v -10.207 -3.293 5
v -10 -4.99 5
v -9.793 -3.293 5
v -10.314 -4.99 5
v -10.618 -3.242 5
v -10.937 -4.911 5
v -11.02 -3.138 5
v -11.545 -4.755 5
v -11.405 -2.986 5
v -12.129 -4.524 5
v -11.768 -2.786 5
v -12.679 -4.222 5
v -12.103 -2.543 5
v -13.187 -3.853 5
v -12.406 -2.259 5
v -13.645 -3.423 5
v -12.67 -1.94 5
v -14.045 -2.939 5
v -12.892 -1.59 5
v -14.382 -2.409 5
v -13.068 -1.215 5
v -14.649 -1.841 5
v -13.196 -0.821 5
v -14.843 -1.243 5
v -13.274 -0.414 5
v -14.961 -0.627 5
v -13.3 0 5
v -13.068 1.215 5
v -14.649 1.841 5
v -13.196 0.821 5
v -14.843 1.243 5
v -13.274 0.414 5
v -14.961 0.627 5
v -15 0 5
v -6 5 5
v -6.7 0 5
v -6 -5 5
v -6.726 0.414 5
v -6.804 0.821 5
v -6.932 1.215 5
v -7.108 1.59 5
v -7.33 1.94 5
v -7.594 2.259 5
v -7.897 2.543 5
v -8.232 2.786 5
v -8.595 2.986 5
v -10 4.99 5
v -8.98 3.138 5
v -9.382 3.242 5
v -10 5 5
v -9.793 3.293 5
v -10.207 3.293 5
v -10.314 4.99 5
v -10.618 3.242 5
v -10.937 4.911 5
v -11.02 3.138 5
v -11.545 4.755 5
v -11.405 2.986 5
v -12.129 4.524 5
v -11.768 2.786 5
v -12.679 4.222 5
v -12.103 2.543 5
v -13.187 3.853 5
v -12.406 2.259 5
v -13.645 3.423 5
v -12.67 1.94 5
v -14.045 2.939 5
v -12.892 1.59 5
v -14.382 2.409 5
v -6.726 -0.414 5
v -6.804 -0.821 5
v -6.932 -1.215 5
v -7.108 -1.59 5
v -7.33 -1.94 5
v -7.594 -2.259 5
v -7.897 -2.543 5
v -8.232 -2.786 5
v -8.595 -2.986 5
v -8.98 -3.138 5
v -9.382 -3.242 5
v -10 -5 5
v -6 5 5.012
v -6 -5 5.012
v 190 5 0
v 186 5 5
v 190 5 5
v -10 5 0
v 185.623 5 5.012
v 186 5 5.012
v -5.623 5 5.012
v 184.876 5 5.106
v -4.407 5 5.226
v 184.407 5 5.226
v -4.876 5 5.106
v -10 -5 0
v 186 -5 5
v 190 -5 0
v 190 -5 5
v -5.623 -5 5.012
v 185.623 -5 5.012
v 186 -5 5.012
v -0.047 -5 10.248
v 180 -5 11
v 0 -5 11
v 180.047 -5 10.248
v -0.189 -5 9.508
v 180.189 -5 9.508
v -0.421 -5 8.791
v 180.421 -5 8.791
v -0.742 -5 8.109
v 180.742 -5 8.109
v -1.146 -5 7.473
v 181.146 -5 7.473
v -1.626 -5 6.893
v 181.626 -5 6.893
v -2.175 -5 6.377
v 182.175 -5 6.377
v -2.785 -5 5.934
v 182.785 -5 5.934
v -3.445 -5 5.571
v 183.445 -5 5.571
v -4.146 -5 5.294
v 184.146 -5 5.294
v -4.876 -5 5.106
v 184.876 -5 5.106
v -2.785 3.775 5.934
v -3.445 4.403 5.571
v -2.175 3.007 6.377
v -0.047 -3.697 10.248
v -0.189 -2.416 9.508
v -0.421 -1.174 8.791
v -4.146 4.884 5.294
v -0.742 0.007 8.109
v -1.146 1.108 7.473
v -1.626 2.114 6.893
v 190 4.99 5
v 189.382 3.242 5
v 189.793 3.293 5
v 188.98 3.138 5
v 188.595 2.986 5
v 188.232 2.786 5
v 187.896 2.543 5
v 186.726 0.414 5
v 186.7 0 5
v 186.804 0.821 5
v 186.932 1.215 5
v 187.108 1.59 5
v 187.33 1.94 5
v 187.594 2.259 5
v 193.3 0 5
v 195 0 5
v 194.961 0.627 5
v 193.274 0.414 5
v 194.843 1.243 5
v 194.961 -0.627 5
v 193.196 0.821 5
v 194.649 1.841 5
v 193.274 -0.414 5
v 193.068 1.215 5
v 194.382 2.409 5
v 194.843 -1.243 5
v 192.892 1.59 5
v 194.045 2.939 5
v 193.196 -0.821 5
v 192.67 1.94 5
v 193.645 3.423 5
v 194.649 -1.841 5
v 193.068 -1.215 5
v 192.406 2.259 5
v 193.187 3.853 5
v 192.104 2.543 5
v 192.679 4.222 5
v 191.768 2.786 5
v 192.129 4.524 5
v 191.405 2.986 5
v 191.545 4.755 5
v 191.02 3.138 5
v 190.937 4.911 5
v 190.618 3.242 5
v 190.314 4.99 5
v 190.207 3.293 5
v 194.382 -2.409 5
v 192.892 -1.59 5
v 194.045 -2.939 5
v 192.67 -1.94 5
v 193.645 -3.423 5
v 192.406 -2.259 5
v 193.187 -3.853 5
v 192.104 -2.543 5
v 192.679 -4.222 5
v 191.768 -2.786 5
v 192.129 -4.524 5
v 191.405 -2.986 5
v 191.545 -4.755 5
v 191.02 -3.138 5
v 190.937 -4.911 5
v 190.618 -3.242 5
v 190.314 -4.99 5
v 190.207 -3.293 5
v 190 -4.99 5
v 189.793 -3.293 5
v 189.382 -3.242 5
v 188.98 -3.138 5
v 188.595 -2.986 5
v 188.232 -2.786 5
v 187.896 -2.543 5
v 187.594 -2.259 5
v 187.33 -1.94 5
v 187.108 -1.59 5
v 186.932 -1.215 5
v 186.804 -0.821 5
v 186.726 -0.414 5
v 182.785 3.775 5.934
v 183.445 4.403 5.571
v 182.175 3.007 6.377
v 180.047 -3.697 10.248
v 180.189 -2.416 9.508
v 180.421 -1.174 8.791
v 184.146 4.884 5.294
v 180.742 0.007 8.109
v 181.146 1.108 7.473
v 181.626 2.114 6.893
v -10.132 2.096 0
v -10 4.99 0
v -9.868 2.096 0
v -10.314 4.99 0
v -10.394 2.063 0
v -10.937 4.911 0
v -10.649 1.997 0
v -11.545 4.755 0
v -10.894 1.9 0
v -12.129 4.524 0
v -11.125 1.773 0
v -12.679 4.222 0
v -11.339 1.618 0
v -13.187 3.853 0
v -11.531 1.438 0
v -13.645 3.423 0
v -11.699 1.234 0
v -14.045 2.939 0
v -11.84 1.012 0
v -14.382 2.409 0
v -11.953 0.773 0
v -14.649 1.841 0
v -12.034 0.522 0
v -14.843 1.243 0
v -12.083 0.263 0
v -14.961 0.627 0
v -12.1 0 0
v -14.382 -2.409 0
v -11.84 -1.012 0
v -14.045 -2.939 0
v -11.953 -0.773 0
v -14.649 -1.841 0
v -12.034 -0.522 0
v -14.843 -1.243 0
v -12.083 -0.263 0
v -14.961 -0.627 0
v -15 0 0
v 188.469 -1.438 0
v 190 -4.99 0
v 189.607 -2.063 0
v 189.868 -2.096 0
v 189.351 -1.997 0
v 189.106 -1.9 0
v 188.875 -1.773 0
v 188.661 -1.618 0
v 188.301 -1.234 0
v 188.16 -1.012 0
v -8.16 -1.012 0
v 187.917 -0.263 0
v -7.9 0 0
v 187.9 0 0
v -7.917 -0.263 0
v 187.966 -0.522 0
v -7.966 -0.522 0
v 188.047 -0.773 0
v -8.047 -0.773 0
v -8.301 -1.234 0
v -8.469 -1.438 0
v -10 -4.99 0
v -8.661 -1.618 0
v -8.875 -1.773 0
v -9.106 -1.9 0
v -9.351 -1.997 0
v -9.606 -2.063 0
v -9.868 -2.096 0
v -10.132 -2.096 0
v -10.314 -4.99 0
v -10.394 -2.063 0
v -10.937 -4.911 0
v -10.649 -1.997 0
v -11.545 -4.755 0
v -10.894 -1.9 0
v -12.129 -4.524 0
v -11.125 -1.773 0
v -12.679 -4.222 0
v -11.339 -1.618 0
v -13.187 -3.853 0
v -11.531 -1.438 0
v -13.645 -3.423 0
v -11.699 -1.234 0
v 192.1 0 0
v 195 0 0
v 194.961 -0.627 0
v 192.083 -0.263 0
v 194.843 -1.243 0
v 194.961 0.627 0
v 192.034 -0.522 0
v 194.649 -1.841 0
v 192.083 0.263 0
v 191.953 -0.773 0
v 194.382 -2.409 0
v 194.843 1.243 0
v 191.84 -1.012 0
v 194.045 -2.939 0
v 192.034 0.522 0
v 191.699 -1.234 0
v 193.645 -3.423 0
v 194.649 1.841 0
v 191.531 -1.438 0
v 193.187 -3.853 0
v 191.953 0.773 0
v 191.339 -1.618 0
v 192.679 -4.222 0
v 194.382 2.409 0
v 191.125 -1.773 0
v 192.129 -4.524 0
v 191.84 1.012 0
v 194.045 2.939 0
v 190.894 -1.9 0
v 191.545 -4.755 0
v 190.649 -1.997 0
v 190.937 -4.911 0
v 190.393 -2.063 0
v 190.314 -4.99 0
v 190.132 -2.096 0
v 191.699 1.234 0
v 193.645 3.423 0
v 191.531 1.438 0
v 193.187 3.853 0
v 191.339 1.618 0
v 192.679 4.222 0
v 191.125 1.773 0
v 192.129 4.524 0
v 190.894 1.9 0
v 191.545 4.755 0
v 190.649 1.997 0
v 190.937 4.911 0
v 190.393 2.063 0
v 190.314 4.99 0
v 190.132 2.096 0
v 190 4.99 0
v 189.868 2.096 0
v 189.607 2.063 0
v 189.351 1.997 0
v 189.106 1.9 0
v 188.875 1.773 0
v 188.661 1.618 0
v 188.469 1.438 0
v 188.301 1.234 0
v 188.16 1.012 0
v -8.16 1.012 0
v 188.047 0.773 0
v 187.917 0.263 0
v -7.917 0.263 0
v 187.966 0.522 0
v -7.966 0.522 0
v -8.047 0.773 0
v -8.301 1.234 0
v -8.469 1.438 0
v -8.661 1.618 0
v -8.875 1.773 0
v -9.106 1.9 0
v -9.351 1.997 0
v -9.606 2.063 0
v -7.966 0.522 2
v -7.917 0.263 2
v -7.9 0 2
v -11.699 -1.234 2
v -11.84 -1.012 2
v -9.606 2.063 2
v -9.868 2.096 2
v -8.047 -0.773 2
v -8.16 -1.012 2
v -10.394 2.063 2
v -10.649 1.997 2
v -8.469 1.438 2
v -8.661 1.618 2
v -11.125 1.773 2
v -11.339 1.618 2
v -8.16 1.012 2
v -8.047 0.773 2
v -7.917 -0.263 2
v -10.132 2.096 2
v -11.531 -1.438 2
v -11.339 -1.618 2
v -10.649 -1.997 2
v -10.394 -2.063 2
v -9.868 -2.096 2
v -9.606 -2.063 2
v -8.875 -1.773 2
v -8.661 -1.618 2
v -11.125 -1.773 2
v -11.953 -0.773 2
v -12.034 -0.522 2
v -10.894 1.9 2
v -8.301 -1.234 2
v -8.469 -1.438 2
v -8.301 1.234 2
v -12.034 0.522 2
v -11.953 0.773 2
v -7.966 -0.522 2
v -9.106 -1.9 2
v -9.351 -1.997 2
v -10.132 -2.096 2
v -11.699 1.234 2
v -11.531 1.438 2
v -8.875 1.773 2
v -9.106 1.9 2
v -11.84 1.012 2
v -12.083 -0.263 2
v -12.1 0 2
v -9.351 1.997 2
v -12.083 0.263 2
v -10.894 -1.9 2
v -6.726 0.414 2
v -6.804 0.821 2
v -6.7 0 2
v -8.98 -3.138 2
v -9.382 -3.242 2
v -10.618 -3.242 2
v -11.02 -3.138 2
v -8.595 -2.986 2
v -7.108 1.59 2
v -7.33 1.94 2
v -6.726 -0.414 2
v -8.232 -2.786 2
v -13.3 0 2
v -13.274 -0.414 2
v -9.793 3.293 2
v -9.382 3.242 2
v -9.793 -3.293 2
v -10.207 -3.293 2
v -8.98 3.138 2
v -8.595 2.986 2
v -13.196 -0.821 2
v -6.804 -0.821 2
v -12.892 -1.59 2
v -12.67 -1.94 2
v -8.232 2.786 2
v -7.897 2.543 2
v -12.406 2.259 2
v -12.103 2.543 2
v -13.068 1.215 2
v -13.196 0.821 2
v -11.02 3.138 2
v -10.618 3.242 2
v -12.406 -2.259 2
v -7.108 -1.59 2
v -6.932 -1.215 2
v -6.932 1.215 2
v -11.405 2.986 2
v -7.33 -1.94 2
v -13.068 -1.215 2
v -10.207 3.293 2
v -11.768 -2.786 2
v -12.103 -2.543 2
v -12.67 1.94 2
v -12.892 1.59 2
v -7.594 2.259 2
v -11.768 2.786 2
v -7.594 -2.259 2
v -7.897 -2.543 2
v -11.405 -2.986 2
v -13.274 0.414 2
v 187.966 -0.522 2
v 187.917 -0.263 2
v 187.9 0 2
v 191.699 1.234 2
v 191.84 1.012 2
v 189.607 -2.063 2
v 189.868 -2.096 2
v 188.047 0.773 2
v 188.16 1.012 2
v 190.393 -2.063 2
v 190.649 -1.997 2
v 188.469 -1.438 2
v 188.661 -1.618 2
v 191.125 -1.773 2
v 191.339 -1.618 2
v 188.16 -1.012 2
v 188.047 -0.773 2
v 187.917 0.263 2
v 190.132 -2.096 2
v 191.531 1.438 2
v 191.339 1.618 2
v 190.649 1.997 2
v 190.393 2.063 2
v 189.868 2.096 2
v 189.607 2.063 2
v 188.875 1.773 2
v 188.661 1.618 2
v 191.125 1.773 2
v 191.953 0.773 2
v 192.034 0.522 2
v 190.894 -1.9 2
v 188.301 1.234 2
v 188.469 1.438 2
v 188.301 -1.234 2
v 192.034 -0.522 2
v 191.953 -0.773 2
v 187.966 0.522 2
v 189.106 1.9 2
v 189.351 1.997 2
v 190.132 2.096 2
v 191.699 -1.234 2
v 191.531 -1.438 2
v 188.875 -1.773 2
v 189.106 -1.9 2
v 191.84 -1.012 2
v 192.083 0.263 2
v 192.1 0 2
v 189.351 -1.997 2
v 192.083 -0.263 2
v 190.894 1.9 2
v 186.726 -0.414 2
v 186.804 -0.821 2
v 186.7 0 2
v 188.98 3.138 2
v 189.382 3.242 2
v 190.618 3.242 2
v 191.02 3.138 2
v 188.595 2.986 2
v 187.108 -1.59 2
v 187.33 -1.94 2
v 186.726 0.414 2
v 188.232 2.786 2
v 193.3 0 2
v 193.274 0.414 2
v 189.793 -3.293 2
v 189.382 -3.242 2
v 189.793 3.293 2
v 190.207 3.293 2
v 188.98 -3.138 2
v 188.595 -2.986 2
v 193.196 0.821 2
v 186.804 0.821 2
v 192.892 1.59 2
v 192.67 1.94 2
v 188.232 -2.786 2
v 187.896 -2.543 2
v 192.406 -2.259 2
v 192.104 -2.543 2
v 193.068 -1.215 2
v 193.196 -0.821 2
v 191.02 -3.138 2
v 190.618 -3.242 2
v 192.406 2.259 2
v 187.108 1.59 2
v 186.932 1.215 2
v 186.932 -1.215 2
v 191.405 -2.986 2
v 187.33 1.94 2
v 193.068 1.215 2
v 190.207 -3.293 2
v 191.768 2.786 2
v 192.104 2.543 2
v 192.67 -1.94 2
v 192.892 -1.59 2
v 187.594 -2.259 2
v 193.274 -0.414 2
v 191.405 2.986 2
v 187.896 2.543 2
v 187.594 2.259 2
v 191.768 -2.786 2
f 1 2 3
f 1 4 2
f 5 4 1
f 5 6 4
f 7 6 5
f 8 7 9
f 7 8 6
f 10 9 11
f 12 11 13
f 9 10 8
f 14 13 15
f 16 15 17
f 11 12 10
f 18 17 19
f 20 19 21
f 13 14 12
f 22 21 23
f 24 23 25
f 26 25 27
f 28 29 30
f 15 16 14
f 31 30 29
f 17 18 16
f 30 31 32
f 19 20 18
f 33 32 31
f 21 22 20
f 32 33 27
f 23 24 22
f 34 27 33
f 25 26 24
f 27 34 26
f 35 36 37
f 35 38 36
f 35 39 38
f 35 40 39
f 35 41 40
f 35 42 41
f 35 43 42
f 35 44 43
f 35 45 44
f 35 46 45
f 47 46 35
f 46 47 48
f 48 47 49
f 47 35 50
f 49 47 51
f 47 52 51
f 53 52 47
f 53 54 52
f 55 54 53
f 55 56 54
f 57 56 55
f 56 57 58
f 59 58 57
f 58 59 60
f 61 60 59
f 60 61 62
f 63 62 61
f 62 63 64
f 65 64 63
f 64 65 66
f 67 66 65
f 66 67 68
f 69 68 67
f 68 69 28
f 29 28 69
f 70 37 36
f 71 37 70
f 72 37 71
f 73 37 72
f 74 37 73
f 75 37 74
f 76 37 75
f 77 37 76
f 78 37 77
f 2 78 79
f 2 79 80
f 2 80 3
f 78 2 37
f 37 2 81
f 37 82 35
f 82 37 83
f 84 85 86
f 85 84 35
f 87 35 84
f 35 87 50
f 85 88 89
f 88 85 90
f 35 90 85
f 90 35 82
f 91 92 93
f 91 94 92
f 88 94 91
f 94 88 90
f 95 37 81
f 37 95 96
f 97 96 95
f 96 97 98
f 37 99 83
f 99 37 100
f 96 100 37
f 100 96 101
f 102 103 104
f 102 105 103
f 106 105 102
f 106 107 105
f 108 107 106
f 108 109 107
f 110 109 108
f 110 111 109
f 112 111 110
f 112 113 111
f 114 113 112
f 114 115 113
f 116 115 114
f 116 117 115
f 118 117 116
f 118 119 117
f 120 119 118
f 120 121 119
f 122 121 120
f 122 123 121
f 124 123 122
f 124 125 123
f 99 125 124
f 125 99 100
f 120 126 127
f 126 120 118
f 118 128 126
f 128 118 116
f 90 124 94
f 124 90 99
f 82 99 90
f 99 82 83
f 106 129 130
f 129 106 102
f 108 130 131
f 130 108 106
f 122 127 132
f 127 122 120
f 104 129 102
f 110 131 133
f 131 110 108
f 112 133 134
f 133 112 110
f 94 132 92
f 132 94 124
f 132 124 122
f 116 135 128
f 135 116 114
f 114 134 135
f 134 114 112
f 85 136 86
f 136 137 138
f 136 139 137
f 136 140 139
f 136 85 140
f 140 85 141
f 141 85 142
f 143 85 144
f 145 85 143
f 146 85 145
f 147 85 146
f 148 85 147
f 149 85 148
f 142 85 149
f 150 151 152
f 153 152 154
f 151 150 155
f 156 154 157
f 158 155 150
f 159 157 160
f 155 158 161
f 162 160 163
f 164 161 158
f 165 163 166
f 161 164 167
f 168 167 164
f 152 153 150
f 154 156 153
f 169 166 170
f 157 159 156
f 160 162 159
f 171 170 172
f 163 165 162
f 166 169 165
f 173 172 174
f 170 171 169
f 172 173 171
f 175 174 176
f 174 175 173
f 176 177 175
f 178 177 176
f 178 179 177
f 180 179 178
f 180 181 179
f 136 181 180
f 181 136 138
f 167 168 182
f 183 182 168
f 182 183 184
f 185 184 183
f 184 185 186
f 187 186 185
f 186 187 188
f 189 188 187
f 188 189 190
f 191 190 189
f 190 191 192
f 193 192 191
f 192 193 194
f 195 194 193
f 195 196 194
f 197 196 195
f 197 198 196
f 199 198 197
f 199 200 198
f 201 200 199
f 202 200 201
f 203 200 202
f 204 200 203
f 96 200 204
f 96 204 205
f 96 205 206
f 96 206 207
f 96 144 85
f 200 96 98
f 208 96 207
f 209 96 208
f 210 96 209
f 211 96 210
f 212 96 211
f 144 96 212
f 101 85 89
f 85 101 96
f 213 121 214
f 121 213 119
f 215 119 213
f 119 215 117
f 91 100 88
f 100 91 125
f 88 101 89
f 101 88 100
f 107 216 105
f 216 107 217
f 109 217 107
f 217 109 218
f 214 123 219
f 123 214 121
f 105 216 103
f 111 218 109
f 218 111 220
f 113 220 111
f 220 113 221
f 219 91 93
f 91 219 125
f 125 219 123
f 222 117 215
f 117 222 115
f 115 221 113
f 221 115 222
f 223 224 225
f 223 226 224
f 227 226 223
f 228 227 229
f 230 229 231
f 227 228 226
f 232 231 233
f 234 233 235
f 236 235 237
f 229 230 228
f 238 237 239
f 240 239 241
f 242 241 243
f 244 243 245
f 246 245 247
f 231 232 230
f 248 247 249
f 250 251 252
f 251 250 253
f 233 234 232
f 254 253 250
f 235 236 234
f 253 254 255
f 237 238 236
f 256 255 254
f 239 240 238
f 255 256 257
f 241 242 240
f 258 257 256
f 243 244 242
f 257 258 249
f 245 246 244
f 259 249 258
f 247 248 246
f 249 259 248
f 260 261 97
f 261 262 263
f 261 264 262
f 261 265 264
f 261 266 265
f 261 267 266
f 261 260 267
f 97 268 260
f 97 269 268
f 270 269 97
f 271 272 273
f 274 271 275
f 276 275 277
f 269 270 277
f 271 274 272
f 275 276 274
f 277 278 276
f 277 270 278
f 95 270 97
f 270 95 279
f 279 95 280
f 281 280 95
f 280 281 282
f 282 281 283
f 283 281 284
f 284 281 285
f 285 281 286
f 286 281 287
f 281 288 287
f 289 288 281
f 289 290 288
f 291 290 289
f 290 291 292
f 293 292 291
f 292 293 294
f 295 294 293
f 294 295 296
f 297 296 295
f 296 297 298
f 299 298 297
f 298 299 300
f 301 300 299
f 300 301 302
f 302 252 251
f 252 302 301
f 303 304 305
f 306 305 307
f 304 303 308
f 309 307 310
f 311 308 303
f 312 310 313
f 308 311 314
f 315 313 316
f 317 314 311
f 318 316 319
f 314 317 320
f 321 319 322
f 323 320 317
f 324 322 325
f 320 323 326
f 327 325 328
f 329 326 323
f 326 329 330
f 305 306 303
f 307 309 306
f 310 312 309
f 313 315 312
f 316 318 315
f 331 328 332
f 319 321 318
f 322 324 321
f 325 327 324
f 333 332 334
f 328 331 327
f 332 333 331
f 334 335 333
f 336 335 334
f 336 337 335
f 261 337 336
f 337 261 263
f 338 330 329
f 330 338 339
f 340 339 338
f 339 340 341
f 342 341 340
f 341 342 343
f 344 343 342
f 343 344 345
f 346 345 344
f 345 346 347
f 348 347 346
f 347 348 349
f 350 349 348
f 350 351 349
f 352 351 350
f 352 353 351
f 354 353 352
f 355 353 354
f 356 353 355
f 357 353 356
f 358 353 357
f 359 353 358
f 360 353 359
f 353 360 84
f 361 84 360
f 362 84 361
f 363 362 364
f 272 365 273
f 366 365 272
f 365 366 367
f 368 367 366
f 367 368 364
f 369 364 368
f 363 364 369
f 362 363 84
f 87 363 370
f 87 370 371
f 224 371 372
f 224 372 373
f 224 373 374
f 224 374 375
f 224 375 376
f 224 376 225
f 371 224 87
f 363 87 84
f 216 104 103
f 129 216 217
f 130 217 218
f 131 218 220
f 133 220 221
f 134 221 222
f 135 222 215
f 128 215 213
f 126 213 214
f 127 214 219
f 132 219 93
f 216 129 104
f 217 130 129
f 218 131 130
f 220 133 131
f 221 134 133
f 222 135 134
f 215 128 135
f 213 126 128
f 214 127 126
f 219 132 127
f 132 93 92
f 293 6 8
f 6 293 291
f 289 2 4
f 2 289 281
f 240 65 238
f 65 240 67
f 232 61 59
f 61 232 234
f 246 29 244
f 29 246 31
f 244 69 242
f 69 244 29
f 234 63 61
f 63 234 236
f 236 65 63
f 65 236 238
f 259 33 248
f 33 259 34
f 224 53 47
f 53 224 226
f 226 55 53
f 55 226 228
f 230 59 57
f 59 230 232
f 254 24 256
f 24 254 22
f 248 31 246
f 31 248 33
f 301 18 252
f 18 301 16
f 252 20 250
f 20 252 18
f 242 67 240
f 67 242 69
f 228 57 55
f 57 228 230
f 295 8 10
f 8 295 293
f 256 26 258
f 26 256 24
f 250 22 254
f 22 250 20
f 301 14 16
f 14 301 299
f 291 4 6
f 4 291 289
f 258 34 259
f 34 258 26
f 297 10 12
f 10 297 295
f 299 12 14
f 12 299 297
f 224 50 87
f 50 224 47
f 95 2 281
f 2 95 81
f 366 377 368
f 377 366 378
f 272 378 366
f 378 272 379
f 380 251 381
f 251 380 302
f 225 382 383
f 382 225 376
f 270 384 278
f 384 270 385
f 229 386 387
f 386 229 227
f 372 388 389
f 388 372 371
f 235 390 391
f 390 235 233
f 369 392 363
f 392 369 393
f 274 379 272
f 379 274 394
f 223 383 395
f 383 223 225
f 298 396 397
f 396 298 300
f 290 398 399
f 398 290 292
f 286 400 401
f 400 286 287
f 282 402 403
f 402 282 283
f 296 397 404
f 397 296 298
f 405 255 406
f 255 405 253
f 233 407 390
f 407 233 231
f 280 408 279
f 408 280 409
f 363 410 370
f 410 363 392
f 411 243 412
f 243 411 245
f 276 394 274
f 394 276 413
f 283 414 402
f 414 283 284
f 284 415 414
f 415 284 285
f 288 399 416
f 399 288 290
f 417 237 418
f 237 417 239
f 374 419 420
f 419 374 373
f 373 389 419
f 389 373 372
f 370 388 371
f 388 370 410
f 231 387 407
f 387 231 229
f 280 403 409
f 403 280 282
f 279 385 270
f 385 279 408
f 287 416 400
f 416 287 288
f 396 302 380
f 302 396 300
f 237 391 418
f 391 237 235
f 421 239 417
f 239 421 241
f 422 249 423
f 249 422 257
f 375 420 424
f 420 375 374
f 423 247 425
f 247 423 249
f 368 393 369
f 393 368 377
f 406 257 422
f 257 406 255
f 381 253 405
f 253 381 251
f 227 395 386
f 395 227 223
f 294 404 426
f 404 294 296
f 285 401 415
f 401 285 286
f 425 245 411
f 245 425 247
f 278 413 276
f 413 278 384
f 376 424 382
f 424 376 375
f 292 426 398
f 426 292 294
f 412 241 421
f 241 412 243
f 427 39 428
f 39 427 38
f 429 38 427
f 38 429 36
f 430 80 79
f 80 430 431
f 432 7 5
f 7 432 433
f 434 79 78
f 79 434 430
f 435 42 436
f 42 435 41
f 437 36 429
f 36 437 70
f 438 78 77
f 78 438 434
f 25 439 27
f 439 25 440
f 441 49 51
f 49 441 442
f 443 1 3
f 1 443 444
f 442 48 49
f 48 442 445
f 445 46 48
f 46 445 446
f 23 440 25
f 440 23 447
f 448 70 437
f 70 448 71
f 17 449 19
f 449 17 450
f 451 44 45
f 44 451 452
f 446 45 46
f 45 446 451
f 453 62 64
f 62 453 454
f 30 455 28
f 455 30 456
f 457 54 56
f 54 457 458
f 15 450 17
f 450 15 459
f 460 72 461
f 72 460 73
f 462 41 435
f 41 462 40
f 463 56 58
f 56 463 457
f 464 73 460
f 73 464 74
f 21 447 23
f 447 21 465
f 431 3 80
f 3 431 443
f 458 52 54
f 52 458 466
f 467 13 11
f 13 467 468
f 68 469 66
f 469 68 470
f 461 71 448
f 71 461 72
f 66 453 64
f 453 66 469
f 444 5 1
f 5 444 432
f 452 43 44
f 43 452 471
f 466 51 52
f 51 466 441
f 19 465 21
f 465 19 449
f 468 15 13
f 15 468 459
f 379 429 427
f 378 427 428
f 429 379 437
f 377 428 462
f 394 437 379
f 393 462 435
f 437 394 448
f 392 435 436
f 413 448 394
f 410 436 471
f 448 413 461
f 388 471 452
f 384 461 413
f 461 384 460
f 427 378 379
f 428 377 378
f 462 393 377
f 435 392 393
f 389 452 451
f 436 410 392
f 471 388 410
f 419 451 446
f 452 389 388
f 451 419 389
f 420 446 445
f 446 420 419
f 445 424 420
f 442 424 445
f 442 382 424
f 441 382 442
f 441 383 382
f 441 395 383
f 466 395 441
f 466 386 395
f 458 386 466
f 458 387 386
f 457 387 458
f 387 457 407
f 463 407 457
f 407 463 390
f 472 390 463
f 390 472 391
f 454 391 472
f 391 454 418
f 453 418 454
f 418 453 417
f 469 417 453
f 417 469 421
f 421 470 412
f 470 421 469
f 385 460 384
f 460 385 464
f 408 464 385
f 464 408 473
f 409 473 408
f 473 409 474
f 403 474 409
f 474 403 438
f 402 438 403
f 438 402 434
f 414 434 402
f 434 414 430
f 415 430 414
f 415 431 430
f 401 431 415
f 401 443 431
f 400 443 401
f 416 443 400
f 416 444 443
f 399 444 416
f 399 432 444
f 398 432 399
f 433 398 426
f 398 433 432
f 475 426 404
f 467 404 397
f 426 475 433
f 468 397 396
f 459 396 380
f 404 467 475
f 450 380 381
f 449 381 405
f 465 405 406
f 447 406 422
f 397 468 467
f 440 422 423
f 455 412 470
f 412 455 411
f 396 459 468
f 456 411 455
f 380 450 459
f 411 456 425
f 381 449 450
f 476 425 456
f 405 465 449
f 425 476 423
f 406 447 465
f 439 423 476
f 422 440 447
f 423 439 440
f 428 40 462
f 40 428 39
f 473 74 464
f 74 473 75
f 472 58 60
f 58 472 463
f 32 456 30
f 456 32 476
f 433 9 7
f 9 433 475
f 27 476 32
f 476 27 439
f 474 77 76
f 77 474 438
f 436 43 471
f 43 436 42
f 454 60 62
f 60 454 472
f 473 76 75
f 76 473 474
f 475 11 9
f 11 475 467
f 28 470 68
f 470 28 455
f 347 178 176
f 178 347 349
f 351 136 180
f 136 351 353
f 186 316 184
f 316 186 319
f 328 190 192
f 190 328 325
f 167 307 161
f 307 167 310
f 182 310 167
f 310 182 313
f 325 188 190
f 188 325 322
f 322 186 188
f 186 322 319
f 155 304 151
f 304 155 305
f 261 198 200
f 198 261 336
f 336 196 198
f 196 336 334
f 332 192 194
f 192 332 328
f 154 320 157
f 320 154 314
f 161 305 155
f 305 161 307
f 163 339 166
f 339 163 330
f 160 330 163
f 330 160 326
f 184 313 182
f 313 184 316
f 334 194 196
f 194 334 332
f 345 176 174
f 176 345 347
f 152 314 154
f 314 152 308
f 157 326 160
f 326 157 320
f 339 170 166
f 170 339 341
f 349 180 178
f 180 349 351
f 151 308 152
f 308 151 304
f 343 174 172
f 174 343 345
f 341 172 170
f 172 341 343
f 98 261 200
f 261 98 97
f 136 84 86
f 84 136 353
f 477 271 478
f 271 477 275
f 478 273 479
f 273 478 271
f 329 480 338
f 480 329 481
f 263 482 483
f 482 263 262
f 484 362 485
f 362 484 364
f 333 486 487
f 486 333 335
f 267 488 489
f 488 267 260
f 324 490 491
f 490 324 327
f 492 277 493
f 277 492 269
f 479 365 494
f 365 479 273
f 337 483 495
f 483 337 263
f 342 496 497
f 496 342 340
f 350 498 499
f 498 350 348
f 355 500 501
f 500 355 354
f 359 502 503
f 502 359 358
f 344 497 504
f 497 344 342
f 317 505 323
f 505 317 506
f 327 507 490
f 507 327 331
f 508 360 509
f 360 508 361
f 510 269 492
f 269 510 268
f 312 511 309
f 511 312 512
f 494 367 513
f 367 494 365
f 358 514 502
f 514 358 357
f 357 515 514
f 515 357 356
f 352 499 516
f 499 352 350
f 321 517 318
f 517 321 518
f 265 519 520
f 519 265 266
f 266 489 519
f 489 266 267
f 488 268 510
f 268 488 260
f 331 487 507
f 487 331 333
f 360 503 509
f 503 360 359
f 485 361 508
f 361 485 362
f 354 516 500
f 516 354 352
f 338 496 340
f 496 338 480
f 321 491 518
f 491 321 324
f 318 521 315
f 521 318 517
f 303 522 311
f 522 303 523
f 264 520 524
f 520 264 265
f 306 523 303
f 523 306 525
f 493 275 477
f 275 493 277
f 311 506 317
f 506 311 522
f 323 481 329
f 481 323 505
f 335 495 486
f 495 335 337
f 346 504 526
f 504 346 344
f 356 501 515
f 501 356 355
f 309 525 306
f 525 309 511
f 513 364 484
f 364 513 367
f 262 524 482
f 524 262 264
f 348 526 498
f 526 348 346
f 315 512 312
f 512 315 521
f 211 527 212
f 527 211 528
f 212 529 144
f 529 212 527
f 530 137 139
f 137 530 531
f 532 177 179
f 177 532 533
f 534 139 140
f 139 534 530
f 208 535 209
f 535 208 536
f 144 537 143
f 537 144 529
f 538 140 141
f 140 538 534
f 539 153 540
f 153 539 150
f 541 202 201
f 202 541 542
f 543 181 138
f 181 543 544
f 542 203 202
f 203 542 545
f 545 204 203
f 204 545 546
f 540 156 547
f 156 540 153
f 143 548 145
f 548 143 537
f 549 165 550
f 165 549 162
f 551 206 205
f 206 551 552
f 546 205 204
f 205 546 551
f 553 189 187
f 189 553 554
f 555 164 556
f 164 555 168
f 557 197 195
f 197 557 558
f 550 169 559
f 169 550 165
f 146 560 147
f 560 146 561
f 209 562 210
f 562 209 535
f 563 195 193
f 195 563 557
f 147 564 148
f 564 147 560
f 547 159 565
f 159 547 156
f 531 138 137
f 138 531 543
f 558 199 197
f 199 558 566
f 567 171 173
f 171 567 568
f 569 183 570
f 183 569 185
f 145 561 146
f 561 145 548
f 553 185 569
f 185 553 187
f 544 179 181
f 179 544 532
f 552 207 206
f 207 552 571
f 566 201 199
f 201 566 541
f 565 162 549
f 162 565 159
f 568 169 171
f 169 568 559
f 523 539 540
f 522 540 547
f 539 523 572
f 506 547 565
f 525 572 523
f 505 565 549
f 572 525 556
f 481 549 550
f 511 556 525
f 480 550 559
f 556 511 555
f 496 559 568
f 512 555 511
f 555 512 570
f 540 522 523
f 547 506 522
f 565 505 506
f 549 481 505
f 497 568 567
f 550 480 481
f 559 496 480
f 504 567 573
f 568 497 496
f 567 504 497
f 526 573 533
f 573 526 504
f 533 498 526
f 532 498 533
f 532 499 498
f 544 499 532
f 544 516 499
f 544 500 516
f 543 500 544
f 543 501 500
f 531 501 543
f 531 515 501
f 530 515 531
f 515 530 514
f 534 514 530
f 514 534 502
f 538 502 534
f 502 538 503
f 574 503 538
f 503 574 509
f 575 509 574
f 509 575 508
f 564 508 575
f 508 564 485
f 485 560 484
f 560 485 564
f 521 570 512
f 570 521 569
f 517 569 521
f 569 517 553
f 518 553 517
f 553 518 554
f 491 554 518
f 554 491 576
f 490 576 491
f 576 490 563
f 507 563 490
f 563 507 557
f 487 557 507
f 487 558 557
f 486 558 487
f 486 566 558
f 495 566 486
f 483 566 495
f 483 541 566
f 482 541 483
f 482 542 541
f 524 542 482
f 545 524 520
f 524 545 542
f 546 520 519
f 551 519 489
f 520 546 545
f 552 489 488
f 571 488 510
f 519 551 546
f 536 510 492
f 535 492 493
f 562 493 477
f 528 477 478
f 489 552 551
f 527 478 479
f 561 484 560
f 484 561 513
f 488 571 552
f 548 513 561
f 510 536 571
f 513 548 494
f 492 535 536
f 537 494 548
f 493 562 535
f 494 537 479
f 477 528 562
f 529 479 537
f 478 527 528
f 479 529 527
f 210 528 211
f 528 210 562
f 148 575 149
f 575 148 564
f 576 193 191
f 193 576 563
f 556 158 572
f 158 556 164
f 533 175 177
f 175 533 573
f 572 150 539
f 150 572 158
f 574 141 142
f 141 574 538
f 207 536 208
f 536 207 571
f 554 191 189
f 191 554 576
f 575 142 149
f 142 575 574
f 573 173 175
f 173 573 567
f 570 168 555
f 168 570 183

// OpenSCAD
$length = 180;
$width = 10;
$height = 11;
$angle = 30;

$nut_width = 3+0.8;
$nut_head_width = 5.4+0.8;
$nut_head_height = 3;
$nut_base = 2;

$tie = 3;

$fn = 50;

translate([0,-$width/2,0]) {
    difference() {
        union () {
            cube([$length,$width,$height]);
            rounding();
            translate([$length,$width,0]) rotate([0,0,180]) rounding();
        }
        translate ([-$width,0,$height]) rotate ([-$angle,0,0]) cube([$length+2*$width,$width*2,$width]);
        //for (i = [10:20:1000]) {
        //    translate ([i,$width+1,($nut_base+$nut_head_height)/2]) rotate ([90,0,0]) cylinder($width+2, $tie/2,$tie/2);
        //}
    }
}
rotate ([0,0,0])
    end();
translate([$length,0,0]) rotate ([0,0,180]) 
    end();

module rounding() {
    $s = $height-$nut_head_height-$nut_base;
    translate([-$s,0,$nut_base+$nut_head_height]) {
        difference() {
            cube ([$s,$width,$s]);
            translate([0,$width+1,$s]) rotate([90,0,0]) cylinder($width+2,$s,$s);
        }
    }
}

module end () {
    translate([-$width,0,0]) {
        difference() {
            union () {
                translate([0,0,0]) 
                    cylinder($nut_base+$nut_head_height,$width/2,$width/2);
                translate([0,-$width/2,0]) 
                    cube([$width, $width, $nut_base+$nut_head_height]);
            }
            translate([0,0,-1]) 
                cylinder($nut_base+$nut_head_height+2,$nut_width/2+0.2,$nut_width/2+0.2);
                        translate([0,0,$nut_base]) 
                cylinder($nut_head_height+1,$nut_head_width/2+0.2,$nut_head_width/2+0.2);

        }
    }
}
